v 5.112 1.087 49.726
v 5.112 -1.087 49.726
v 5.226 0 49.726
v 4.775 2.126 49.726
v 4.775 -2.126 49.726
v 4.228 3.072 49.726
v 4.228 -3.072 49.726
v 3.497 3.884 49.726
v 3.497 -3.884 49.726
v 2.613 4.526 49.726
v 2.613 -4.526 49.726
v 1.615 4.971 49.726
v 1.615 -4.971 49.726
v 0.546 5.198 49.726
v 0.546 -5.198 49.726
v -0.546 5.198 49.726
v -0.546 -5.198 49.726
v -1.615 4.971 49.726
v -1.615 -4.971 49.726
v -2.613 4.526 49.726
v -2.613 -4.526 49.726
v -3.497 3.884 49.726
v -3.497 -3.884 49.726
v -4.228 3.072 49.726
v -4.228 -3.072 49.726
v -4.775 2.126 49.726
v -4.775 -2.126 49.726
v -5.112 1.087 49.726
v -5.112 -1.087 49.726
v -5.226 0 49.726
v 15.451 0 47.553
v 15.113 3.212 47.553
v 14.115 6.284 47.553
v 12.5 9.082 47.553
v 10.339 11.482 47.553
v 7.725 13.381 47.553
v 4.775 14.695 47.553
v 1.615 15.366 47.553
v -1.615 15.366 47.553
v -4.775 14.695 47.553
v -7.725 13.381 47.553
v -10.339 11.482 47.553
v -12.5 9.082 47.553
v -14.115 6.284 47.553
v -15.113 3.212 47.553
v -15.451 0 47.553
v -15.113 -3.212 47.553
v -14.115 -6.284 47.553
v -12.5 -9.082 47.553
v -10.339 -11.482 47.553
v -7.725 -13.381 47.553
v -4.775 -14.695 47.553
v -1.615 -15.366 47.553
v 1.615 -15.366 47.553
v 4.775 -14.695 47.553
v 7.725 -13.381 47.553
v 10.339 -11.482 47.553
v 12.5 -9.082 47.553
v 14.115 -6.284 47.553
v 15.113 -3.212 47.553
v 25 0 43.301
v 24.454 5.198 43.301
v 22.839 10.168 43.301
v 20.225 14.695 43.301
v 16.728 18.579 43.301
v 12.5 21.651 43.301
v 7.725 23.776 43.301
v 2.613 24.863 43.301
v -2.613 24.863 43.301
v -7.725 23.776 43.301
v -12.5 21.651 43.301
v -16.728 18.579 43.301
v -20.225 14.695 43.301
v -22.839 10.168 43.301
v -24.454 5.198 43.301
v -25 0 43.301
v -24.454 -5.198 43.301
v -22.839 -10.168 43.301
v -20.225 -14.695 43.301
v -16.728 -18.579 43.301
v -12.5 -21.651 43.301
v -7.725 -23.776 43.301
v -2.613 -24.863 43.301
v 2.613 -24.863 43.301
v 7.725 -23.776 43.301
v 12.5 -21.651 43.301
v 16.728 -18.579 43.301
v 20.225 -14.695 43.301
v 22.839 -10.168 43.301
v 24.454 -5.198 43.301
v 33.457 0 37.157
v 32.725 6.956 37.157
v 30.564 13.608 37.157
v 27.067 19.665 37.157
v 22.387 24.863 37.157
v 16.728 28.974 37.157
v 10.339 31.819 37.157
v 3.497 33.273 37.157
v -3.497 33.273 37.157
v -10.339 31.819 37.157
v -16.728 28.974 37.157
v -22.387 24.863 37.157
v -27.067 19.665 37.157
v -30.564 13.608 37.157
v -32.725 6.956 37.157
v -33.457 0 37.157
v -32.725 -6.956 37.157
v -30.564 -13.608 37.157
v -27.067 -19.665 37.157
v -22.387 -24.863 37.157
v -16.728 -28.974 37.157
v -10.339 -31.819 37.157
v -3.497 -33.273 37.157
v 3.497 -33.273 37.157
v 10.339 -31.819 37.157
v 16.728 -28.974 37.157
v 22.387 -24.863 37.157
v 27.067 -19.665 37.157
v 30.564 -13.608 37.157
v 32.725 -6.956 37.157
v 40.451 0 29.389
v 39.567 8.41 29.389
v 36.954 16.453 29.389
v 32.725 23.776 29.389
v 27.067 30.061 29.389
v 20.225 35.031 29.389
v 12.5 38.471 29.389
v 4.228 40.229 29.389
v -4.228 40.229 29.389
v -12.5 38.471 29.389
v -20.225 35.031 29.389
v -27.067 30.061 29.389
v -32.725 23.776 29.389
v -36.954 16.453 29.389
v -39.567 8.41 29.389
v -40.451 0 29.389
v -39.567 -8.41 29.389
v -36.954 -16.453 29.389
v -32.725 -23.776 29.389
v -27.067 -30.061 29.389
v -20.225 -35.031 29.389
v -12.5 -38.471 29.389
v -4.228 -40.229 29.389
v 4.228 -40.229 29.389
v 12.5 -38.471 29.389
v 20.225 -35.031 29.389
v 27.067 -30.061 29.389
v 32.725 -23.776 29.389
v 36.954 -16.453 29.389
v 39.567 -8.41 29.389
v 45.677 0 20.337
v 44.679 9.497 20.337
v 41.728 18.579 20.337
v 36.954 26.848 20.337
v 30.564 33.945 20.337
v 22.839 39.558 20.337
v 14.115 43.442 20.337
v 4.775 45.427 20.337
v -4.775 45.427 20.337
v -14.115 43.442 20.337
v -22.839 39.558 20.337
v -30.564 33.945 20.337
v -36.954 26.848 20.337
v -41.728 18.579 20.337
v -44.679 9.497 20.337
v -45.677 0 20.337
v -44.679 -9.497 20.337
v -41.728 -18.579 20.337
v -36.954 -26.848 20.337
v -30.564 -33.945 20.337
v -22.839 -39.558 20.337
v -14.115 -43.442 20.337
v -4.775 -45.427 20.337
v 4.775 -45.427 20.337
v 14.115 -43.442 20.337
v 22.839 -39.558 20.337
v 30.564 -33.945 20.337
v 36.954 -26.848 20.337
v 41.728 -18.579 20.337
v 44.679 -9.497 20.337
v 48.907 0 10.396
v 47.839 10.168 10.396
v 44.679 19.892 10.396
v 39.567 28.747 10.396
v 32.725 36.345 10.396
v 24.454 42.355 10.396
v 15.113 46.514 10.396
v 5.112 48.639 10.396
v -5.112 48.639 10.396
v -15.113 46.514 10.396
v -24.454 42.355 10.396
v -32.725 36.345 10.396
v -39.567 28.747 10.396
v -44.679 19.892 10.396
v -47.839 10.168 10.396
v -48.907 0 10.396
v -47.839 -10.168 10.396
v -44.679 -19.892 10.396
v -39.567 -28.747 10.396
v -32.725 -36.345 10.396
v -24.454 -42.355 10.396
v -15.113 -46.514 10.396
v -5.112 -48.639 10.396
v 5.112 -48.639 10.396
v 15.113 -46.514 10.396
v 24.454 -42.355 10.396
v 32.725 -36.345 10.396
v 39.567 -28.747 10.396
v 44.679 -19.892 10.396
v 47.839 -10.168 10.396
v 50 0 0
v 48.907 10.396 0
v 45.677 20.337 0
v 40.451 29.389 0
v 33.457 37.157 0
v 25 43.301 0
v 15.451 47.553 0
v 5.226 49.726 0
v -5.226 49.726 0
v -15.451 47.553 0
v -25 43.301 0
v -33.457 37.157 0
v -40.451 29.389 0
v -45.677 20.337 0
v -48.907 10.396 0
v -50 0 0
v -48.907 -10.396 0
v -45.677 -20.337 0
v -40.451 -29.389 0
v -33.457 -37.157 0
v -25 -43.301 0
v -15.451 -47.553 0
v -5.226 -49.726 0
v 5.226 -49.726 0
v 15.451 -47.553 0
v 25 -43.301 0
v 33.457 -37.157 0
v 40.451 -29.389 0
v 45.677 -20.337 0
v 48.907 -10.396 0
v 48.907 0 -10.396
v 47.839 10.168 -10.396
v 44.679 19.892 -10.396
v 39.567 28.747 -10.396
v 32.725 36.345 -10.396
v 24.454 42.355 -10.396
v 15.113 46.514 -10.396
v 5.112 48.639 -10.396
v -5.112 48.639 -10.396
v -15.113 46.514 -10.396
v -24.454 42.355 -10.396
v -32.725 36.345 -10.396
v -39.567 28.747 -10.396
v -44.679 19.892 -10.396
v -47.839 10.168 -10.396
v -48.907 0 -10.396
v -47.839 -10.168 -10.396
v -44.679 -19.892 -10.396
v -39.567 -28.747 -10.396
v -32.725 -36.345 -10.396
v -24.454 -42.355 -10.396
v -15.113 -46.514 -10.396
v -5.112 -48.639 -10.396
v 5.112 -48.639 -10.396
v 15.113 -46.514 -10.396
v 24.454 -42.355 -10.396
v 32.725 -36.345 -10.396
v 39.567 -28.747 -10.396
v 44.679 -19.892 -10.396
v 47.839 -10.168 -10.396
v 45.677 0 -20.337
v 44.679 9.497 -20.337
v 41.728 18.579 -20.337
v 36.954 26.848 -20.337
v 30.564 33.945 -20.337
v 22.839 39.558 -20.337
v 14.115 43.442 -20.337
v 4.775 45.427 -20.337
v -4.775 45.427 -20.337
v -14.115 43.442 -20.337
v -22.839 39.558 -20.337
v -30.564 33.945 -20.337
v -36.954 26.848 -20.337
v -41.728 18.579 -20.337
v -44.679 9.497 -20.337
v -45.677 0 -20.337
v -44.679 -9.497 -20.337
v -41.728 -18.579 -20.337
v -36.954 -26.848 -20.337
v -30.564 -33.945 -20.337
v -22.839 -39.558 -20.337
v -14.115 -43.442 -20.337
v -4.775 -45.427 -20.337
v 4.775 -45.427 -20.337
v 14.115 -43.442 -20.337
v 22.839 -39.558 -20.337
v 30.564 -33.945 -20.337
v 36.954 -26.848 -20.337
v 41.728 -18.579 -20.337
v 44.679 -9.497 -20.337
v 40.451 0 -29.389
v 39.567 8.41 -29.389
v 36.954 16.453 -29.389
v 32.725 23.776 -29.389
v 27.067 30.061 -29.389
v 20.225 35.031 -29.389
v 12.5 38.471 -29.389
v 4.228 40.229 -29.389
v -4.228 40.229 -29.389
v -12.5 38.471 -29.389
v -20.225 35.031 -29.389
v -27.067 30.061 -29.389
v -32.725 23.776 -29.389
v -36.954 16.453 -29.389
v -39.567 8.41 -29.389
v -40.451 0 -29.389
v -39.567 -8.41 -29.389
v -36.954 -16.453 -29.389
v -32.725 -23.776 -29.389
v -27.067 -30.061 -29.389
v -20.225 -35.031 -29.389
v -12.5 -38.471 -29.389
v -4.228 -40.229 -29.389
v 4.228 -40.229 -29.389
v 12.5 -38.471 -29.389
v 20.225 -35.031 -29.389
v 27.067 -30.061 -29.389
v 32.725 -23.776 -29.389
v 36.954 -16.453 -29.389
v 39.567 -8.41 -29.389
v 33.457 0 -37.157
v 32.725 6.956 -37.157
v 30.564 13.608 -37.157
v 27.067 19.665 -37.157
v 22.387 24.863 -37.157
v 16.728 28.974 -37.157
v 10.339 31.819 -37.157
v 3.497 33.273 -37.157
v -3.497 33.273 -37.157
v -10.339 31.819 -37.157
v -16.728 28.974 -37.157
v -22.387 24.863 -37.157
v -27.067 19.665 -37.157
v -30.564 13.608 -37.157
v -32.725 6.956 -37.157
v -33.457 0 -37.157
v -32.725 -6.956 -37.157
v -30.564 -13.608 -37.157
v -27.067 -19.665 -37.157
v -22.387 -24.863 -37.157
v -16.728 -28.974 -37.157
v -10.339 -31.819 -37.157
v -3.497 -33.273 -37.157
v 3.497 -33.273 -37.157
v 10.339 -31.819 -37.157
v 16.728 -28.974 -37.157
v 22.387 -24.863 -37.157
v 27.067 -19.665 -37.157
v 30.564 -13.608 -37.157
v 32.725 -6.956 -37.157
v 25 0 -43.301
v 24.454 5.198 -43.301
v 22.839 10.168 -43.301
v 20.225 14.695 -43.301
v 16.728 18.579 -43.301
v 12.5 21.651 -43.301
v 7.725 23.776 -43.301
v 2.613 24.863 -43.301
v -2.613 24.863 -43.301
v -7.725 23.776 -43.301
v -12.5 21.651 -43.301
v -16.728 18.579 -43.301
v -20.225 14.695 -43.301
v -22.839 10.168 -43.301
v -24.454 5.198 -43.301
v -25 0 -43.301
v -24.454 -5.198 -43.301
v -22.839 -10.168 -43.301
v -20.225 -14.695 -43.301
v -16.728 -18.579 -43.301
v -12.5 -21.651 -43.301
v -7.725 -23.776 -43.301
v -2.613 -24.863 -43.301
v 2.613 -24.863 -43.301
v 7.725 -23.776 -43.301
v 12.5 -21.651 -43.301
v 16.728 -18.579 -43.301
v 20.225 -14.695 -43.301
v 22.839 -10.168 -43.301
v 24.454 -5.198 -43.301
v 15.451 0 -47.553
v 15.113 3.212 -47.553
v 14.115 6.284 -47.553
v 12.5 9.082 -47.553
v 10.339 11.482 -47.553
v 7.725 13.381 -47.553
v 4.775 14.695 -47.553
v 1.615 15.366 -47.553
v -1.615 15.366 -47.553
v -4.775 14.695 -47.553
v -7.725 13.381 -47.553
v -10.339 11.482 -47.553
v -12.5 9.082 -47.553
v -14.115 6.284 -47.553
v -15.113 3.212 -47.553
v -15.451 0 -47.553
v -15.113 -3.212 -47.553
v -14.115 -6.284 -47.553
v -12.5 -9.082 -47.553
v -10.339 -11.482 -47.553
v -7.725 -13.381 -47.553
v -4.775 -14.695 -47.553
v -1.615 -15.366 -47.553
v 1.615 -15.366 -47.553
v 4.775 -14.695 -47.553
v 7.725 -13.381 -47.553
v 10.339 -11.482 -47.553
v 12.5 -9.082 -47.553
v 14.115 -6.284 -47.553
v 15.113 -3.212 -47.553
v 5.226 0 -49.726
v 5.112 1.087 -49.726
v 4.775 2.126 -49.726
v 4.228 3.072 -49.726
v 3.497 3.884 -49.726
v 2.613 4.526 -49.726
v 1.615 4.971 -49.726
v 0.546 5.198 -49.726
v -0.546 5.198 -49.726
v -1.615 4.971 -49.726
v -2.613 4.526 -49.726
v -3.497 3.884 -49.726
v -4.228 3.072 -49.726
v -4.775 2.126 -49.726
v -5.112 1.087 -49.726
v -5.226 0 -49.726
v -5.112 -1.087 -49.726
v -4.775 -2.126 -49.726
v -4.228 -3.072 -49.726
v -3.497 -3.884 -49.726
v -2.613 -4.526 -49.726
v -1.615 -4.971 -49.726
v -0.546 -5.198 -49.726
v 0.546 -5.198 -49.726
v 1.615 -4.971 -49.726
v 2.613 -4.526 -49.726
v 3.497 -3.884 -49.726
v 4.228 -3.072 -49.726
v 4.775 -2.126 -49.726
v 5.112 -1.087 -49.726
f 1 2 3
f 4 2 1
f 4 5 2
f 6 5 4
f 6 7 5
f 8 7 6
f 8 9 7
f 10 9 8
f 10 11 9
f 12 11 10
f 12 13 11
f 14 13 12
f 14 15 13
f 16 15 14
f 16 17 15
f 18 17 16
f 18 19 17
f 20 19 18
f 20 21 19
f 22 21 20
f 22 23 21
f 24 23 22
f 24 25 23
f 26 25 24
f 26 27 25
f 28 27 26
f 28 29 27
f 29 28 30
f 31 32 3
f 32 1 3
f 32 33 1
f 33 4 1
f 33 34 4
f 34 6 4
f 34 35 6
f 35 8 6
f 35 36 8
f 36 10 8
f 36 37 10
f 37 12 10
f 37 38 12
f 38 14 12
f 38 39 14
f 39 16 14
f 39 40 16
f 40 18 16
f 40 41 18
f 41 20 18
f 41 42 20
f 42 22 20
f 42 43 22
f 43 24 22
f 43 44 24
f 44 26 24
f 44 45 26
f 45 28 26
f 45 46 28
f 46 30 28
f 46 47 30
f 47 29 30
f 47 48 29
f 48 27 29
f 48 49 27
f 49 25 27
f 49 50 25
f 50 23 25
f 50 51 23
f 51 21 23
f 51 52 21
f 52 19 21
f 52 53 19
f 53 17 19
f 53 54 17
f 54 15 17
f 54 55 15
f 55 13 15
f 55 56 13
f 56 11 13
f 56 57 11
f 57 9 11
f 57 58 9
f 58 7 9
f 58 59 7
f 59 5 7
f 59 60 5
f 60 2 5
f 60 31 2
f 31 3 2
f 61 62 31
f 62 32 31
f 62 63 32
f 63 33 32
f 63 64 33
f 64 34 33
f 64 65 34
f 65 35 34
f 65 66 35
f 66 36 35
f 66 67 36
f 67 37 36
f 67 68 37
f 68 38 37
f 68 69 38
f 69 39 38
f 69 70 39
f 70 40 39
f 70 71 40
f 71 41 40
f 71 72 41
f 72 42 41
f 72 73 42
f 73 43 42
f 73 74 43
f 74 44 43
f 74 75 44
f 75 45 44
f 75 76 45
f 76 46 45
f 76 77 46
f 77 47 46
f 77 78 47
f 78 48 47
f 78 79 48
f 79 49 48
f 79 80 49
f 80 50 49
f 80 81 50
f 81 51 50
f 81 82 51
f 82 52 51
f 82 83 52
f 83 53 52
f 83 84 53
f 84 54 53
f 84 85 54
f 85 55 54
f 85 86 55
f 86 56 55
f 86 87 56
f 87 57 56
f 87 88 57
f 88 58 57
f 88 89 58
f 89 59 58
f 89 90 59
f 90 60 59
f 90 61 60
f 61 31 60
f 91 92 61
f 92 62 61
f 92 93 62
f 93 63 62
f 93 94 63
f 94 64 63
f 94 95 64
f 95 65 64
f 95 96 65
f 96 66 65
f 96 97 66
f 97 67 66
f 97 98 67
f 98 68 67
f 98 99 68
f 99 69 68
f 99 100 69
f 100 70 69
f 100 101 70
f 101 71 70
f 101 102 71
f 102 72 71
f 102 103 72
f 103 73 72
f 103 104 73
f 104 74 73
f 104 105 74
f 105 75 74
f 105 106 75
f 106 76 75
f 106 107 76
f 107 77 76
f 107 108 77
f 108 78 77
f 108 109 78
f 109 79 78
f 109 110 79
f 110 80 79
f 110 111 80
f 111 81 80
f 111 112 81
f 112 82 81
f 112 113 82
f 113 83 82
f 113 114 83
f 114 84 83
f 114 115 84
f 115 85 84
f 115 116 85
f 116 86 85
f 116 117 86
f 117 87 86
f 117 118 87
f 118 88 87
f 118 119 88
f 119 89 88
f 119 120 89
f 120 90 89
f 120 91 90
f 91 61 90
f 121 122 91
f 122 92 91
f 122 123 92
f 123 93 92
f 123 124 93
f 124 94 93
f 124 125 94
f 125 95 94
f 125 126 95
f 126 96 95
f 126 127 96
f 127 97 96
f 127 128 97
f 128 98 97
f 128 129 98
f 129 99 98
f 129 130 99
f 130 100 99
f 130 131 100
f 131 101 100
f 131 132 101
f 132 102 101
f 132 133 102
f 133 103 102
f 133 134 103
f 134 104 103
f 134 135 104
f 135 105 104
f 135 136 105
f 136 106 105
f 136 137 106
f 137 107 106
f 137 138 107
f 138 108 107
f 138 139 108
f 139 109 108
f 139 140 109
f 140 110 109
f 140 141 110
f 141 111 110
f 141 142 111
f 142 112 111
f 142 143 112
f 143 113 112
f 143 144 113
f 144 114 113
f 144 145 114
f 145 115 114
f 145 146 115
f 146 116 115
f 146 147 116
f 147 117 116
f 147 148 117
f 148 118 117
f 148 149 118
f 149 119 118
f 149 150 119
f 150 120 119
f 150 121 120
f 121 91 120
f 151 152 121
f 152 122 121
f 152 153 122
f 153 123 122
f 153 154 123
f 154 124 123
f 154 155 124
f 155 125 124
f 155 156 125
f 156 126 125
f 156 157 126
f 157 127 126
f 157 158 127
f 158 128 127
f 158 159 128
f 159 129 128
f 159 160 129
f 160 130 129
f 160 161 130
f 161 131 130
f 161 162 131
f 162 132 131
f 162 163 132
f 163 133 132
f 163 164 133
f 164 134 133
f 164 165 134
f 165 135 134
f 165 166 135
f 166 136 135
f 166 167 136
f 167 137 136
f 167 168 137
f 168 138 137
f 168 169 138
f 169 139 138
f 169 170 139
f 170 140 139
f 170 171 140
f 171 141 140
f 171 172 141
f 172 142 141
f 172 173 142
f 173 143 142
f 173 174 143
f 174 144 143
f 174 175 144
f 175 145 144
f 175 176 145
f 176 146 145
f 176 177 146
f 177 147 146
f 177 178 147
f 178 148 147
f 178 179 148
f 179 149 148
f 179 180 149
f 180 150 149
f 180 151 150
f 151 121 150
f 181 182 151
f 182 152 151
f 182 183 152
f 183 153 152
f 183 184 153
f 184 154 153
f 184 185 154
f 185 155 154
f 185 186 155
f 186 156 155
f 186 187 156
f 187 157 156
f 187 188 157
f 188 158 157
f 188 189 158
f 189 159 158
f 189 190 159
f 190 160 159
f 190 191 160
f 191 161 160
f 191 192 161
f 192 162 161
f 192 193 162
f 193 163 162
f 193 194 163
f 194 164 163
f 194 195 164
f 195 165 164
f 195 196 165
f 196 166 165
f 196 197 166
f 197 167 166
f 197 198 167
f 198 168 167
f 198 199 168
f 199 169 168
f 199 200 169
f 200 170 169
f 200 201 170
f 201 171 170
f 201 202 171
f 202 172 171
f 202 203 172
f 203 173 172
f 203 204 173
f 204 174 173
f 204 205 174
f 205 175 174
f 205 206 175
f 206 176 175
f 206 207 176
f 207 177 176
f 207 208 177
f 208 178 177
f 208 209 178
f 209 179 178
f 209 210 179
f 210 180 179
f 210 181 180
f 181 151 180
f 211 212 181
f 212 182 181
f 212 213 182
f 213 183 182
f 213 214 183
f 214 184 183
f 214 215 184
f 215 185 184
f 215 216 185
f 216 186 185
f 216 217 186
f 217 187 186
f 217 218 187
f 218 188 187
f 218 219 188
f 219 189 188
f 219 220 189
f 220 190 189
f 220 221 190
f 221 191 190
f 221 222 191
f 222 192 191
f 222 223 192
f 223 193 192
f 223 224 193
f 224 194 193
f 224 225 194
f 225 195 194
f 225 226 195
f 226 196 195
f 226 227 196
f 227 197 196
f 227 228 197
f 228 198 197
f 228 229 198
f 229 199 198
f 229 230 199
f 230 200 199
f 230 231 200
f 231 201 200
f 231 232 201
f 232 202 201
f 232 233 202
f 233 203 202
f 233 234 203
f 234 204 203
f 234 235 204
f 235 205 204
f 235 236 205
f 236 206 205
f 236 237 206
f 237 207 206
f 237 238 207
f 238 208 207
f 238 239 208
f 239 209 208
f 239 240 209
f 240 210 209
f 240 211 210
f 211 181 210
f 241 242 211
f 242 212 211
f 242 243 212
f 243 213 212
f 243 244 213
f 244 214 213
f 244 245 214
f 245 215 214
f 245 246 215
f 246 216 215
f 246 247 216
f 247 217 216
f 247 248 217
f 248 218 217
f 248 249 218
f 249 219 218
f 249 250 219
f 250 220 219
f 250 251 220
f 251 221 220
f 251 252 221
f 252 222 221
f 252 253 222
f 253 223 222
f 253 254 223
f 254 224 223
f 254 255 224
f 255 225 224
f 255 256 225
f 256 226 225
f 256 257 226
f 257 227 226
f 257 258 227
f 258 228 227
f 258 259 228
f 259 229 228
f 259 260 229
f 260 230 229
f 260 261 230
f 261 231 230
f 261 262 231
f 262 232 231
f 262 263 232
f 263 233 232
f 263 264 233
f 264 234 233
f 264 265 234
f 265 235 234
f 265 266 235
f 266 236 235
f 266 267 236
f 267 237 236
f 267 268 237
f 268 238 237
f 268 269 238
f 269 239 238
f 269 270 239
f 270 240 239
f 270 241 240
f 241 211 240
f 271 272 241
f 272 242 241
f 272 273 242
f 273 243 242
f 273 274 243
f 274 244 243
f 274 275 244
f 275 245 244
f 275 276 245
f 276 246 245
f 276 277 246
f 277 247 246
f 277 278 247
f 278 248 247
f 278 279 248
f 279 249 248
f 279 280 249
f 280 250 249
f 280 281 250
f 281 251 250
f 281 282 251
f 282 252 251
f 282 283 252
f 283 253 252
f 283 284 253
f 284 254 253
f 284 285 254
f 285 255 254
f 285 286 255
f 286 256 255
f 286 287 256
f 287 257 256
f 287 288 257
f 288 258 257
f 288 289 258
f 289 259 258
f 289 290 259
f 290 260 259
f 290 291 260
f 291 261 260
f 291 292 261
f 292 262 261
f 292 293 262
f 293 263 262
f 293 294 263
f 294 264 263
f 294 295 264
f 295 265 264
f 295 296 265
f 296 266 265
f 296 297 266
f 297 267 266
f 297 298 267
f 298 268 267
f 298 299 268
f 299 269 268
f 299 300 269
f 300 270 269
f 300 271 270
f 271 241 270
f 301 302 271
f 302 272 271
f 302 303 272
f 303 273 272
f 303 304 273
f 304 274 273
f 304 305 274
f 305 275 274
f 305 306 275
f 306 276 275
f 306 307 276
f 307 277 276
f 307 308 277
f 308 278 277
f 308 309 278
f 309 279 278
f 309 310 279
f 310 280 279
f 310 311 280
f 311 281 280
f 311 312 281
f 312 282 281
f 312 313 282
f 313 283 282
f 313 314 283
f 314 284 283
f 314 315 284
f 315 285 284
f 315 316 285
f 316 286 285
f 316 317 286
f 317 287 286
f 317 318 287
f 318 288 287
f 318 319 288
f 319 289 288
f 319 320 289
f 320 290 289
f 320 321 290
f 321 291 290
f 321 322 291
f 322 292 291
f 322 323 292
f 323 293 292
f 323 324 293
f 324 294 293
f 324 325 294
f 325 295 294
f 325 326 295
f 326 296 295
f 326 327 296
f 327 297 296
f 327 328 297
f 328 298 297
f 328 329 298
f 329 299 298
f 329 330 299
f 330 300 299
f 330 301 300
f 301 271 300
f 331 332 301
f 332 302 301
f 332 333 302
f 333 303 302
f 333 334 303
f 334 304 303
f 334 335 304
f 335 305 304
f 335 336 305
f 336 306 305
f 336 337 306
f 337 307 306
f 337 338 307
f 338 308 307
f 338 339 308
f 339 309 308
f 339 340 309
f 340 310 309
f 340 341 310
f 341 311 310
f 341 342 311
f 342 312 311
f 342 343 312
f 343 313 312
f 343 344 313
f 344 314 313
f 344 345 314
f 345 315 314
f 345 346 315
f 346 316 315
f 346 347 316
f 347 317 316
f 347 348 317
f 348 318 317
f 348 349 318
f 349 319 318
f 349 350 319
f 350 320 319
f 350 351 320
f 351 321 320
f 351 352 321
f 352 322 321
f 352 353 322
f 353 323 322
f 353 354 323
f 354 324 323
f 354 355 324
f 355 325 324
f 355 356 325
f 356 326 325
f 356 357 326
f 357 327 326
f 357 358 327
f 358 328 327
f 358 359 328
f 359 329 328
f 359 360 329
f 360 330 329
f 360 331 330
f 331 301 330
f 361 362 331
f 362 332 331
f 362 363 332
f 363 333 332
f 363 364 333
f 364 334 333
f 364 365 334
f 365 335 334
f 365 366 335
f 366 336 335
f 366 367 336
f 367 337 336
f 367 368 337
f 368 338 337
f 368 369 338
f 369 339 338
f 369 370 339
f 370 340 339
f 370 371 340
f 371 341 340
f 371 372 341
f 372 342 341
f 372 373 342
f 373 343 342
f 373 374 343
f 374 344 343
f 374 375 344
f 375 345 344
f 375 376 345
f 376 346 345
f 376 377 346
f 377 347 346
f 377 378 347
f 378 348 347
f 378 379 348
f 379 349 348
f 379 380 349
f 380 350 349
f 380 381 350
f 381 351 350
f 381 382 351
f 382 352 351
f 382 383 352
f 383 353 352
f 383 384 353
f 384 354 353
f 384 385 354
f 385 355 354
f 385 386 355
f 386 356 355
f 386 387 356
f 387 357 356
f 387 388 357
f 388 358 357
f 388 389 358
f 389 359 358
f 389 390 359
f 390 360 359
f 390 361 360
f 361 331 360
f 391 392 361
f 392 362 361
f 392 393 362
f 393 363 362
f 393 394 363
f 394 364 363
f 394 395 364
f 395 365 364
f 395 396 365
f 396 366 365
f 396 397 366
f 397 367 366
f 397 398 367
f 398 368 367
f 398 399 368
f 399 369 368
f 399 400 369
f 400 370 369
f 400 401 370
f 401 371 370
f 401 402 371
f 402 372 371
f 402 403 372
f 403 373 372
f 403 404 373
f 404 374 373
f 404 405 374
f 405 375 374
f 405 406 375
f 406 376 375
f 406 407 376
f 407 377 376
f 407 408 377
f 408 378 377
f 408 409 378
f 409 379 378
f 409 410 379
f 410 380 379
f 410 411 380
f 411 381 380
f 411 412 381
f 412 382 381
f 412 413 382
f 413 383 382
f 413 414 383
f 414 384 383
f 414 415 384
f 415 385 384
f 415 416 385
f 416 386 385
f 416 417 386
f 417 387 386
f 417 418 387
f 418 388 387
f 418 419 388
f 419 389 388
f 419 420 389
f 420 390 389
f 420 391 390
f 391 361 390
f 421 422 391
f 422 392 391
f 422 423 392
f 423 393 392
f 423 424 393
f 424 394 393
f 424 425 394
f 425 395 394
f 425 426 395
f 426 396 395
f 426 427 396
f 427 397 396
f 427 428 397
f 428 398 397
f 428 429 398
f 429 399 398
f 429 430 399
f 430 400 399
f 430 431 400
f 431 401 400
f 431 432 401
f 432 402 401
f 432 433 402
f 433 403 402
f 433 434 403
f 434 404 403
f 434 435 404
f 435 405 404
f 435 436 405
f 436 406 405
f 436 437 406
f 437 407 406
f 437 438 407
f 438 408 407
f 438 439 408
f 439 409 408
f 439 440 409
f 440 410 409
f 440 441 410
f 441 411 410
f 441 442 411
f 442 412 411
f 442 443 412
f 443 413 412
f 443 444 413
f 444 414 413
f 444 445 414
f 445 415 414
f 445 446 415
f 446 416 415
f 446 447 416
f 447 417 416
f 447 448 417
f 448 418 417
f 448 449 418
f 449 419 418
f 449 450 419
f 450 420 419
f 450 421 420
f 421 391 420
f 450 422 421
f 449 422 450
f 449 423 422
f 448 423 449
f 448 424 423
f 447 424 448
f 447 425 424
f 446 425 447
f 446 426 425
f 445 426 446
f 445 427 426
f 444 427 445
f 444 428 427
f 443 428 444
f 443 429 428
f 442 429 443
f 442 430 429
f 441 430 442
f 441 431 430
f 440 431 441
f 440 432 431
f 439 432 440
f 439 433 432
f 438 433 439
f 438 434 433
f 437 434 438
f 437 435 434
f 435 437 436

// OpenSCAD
snowmanHeight = 100;
bottomDia = snowmanHeight/2;
middleDia = snowmanHeight/3;
topDia = snowmanHeight - middleDia - bottomDia;
// bottom sphere
sphere(bottomDia);
